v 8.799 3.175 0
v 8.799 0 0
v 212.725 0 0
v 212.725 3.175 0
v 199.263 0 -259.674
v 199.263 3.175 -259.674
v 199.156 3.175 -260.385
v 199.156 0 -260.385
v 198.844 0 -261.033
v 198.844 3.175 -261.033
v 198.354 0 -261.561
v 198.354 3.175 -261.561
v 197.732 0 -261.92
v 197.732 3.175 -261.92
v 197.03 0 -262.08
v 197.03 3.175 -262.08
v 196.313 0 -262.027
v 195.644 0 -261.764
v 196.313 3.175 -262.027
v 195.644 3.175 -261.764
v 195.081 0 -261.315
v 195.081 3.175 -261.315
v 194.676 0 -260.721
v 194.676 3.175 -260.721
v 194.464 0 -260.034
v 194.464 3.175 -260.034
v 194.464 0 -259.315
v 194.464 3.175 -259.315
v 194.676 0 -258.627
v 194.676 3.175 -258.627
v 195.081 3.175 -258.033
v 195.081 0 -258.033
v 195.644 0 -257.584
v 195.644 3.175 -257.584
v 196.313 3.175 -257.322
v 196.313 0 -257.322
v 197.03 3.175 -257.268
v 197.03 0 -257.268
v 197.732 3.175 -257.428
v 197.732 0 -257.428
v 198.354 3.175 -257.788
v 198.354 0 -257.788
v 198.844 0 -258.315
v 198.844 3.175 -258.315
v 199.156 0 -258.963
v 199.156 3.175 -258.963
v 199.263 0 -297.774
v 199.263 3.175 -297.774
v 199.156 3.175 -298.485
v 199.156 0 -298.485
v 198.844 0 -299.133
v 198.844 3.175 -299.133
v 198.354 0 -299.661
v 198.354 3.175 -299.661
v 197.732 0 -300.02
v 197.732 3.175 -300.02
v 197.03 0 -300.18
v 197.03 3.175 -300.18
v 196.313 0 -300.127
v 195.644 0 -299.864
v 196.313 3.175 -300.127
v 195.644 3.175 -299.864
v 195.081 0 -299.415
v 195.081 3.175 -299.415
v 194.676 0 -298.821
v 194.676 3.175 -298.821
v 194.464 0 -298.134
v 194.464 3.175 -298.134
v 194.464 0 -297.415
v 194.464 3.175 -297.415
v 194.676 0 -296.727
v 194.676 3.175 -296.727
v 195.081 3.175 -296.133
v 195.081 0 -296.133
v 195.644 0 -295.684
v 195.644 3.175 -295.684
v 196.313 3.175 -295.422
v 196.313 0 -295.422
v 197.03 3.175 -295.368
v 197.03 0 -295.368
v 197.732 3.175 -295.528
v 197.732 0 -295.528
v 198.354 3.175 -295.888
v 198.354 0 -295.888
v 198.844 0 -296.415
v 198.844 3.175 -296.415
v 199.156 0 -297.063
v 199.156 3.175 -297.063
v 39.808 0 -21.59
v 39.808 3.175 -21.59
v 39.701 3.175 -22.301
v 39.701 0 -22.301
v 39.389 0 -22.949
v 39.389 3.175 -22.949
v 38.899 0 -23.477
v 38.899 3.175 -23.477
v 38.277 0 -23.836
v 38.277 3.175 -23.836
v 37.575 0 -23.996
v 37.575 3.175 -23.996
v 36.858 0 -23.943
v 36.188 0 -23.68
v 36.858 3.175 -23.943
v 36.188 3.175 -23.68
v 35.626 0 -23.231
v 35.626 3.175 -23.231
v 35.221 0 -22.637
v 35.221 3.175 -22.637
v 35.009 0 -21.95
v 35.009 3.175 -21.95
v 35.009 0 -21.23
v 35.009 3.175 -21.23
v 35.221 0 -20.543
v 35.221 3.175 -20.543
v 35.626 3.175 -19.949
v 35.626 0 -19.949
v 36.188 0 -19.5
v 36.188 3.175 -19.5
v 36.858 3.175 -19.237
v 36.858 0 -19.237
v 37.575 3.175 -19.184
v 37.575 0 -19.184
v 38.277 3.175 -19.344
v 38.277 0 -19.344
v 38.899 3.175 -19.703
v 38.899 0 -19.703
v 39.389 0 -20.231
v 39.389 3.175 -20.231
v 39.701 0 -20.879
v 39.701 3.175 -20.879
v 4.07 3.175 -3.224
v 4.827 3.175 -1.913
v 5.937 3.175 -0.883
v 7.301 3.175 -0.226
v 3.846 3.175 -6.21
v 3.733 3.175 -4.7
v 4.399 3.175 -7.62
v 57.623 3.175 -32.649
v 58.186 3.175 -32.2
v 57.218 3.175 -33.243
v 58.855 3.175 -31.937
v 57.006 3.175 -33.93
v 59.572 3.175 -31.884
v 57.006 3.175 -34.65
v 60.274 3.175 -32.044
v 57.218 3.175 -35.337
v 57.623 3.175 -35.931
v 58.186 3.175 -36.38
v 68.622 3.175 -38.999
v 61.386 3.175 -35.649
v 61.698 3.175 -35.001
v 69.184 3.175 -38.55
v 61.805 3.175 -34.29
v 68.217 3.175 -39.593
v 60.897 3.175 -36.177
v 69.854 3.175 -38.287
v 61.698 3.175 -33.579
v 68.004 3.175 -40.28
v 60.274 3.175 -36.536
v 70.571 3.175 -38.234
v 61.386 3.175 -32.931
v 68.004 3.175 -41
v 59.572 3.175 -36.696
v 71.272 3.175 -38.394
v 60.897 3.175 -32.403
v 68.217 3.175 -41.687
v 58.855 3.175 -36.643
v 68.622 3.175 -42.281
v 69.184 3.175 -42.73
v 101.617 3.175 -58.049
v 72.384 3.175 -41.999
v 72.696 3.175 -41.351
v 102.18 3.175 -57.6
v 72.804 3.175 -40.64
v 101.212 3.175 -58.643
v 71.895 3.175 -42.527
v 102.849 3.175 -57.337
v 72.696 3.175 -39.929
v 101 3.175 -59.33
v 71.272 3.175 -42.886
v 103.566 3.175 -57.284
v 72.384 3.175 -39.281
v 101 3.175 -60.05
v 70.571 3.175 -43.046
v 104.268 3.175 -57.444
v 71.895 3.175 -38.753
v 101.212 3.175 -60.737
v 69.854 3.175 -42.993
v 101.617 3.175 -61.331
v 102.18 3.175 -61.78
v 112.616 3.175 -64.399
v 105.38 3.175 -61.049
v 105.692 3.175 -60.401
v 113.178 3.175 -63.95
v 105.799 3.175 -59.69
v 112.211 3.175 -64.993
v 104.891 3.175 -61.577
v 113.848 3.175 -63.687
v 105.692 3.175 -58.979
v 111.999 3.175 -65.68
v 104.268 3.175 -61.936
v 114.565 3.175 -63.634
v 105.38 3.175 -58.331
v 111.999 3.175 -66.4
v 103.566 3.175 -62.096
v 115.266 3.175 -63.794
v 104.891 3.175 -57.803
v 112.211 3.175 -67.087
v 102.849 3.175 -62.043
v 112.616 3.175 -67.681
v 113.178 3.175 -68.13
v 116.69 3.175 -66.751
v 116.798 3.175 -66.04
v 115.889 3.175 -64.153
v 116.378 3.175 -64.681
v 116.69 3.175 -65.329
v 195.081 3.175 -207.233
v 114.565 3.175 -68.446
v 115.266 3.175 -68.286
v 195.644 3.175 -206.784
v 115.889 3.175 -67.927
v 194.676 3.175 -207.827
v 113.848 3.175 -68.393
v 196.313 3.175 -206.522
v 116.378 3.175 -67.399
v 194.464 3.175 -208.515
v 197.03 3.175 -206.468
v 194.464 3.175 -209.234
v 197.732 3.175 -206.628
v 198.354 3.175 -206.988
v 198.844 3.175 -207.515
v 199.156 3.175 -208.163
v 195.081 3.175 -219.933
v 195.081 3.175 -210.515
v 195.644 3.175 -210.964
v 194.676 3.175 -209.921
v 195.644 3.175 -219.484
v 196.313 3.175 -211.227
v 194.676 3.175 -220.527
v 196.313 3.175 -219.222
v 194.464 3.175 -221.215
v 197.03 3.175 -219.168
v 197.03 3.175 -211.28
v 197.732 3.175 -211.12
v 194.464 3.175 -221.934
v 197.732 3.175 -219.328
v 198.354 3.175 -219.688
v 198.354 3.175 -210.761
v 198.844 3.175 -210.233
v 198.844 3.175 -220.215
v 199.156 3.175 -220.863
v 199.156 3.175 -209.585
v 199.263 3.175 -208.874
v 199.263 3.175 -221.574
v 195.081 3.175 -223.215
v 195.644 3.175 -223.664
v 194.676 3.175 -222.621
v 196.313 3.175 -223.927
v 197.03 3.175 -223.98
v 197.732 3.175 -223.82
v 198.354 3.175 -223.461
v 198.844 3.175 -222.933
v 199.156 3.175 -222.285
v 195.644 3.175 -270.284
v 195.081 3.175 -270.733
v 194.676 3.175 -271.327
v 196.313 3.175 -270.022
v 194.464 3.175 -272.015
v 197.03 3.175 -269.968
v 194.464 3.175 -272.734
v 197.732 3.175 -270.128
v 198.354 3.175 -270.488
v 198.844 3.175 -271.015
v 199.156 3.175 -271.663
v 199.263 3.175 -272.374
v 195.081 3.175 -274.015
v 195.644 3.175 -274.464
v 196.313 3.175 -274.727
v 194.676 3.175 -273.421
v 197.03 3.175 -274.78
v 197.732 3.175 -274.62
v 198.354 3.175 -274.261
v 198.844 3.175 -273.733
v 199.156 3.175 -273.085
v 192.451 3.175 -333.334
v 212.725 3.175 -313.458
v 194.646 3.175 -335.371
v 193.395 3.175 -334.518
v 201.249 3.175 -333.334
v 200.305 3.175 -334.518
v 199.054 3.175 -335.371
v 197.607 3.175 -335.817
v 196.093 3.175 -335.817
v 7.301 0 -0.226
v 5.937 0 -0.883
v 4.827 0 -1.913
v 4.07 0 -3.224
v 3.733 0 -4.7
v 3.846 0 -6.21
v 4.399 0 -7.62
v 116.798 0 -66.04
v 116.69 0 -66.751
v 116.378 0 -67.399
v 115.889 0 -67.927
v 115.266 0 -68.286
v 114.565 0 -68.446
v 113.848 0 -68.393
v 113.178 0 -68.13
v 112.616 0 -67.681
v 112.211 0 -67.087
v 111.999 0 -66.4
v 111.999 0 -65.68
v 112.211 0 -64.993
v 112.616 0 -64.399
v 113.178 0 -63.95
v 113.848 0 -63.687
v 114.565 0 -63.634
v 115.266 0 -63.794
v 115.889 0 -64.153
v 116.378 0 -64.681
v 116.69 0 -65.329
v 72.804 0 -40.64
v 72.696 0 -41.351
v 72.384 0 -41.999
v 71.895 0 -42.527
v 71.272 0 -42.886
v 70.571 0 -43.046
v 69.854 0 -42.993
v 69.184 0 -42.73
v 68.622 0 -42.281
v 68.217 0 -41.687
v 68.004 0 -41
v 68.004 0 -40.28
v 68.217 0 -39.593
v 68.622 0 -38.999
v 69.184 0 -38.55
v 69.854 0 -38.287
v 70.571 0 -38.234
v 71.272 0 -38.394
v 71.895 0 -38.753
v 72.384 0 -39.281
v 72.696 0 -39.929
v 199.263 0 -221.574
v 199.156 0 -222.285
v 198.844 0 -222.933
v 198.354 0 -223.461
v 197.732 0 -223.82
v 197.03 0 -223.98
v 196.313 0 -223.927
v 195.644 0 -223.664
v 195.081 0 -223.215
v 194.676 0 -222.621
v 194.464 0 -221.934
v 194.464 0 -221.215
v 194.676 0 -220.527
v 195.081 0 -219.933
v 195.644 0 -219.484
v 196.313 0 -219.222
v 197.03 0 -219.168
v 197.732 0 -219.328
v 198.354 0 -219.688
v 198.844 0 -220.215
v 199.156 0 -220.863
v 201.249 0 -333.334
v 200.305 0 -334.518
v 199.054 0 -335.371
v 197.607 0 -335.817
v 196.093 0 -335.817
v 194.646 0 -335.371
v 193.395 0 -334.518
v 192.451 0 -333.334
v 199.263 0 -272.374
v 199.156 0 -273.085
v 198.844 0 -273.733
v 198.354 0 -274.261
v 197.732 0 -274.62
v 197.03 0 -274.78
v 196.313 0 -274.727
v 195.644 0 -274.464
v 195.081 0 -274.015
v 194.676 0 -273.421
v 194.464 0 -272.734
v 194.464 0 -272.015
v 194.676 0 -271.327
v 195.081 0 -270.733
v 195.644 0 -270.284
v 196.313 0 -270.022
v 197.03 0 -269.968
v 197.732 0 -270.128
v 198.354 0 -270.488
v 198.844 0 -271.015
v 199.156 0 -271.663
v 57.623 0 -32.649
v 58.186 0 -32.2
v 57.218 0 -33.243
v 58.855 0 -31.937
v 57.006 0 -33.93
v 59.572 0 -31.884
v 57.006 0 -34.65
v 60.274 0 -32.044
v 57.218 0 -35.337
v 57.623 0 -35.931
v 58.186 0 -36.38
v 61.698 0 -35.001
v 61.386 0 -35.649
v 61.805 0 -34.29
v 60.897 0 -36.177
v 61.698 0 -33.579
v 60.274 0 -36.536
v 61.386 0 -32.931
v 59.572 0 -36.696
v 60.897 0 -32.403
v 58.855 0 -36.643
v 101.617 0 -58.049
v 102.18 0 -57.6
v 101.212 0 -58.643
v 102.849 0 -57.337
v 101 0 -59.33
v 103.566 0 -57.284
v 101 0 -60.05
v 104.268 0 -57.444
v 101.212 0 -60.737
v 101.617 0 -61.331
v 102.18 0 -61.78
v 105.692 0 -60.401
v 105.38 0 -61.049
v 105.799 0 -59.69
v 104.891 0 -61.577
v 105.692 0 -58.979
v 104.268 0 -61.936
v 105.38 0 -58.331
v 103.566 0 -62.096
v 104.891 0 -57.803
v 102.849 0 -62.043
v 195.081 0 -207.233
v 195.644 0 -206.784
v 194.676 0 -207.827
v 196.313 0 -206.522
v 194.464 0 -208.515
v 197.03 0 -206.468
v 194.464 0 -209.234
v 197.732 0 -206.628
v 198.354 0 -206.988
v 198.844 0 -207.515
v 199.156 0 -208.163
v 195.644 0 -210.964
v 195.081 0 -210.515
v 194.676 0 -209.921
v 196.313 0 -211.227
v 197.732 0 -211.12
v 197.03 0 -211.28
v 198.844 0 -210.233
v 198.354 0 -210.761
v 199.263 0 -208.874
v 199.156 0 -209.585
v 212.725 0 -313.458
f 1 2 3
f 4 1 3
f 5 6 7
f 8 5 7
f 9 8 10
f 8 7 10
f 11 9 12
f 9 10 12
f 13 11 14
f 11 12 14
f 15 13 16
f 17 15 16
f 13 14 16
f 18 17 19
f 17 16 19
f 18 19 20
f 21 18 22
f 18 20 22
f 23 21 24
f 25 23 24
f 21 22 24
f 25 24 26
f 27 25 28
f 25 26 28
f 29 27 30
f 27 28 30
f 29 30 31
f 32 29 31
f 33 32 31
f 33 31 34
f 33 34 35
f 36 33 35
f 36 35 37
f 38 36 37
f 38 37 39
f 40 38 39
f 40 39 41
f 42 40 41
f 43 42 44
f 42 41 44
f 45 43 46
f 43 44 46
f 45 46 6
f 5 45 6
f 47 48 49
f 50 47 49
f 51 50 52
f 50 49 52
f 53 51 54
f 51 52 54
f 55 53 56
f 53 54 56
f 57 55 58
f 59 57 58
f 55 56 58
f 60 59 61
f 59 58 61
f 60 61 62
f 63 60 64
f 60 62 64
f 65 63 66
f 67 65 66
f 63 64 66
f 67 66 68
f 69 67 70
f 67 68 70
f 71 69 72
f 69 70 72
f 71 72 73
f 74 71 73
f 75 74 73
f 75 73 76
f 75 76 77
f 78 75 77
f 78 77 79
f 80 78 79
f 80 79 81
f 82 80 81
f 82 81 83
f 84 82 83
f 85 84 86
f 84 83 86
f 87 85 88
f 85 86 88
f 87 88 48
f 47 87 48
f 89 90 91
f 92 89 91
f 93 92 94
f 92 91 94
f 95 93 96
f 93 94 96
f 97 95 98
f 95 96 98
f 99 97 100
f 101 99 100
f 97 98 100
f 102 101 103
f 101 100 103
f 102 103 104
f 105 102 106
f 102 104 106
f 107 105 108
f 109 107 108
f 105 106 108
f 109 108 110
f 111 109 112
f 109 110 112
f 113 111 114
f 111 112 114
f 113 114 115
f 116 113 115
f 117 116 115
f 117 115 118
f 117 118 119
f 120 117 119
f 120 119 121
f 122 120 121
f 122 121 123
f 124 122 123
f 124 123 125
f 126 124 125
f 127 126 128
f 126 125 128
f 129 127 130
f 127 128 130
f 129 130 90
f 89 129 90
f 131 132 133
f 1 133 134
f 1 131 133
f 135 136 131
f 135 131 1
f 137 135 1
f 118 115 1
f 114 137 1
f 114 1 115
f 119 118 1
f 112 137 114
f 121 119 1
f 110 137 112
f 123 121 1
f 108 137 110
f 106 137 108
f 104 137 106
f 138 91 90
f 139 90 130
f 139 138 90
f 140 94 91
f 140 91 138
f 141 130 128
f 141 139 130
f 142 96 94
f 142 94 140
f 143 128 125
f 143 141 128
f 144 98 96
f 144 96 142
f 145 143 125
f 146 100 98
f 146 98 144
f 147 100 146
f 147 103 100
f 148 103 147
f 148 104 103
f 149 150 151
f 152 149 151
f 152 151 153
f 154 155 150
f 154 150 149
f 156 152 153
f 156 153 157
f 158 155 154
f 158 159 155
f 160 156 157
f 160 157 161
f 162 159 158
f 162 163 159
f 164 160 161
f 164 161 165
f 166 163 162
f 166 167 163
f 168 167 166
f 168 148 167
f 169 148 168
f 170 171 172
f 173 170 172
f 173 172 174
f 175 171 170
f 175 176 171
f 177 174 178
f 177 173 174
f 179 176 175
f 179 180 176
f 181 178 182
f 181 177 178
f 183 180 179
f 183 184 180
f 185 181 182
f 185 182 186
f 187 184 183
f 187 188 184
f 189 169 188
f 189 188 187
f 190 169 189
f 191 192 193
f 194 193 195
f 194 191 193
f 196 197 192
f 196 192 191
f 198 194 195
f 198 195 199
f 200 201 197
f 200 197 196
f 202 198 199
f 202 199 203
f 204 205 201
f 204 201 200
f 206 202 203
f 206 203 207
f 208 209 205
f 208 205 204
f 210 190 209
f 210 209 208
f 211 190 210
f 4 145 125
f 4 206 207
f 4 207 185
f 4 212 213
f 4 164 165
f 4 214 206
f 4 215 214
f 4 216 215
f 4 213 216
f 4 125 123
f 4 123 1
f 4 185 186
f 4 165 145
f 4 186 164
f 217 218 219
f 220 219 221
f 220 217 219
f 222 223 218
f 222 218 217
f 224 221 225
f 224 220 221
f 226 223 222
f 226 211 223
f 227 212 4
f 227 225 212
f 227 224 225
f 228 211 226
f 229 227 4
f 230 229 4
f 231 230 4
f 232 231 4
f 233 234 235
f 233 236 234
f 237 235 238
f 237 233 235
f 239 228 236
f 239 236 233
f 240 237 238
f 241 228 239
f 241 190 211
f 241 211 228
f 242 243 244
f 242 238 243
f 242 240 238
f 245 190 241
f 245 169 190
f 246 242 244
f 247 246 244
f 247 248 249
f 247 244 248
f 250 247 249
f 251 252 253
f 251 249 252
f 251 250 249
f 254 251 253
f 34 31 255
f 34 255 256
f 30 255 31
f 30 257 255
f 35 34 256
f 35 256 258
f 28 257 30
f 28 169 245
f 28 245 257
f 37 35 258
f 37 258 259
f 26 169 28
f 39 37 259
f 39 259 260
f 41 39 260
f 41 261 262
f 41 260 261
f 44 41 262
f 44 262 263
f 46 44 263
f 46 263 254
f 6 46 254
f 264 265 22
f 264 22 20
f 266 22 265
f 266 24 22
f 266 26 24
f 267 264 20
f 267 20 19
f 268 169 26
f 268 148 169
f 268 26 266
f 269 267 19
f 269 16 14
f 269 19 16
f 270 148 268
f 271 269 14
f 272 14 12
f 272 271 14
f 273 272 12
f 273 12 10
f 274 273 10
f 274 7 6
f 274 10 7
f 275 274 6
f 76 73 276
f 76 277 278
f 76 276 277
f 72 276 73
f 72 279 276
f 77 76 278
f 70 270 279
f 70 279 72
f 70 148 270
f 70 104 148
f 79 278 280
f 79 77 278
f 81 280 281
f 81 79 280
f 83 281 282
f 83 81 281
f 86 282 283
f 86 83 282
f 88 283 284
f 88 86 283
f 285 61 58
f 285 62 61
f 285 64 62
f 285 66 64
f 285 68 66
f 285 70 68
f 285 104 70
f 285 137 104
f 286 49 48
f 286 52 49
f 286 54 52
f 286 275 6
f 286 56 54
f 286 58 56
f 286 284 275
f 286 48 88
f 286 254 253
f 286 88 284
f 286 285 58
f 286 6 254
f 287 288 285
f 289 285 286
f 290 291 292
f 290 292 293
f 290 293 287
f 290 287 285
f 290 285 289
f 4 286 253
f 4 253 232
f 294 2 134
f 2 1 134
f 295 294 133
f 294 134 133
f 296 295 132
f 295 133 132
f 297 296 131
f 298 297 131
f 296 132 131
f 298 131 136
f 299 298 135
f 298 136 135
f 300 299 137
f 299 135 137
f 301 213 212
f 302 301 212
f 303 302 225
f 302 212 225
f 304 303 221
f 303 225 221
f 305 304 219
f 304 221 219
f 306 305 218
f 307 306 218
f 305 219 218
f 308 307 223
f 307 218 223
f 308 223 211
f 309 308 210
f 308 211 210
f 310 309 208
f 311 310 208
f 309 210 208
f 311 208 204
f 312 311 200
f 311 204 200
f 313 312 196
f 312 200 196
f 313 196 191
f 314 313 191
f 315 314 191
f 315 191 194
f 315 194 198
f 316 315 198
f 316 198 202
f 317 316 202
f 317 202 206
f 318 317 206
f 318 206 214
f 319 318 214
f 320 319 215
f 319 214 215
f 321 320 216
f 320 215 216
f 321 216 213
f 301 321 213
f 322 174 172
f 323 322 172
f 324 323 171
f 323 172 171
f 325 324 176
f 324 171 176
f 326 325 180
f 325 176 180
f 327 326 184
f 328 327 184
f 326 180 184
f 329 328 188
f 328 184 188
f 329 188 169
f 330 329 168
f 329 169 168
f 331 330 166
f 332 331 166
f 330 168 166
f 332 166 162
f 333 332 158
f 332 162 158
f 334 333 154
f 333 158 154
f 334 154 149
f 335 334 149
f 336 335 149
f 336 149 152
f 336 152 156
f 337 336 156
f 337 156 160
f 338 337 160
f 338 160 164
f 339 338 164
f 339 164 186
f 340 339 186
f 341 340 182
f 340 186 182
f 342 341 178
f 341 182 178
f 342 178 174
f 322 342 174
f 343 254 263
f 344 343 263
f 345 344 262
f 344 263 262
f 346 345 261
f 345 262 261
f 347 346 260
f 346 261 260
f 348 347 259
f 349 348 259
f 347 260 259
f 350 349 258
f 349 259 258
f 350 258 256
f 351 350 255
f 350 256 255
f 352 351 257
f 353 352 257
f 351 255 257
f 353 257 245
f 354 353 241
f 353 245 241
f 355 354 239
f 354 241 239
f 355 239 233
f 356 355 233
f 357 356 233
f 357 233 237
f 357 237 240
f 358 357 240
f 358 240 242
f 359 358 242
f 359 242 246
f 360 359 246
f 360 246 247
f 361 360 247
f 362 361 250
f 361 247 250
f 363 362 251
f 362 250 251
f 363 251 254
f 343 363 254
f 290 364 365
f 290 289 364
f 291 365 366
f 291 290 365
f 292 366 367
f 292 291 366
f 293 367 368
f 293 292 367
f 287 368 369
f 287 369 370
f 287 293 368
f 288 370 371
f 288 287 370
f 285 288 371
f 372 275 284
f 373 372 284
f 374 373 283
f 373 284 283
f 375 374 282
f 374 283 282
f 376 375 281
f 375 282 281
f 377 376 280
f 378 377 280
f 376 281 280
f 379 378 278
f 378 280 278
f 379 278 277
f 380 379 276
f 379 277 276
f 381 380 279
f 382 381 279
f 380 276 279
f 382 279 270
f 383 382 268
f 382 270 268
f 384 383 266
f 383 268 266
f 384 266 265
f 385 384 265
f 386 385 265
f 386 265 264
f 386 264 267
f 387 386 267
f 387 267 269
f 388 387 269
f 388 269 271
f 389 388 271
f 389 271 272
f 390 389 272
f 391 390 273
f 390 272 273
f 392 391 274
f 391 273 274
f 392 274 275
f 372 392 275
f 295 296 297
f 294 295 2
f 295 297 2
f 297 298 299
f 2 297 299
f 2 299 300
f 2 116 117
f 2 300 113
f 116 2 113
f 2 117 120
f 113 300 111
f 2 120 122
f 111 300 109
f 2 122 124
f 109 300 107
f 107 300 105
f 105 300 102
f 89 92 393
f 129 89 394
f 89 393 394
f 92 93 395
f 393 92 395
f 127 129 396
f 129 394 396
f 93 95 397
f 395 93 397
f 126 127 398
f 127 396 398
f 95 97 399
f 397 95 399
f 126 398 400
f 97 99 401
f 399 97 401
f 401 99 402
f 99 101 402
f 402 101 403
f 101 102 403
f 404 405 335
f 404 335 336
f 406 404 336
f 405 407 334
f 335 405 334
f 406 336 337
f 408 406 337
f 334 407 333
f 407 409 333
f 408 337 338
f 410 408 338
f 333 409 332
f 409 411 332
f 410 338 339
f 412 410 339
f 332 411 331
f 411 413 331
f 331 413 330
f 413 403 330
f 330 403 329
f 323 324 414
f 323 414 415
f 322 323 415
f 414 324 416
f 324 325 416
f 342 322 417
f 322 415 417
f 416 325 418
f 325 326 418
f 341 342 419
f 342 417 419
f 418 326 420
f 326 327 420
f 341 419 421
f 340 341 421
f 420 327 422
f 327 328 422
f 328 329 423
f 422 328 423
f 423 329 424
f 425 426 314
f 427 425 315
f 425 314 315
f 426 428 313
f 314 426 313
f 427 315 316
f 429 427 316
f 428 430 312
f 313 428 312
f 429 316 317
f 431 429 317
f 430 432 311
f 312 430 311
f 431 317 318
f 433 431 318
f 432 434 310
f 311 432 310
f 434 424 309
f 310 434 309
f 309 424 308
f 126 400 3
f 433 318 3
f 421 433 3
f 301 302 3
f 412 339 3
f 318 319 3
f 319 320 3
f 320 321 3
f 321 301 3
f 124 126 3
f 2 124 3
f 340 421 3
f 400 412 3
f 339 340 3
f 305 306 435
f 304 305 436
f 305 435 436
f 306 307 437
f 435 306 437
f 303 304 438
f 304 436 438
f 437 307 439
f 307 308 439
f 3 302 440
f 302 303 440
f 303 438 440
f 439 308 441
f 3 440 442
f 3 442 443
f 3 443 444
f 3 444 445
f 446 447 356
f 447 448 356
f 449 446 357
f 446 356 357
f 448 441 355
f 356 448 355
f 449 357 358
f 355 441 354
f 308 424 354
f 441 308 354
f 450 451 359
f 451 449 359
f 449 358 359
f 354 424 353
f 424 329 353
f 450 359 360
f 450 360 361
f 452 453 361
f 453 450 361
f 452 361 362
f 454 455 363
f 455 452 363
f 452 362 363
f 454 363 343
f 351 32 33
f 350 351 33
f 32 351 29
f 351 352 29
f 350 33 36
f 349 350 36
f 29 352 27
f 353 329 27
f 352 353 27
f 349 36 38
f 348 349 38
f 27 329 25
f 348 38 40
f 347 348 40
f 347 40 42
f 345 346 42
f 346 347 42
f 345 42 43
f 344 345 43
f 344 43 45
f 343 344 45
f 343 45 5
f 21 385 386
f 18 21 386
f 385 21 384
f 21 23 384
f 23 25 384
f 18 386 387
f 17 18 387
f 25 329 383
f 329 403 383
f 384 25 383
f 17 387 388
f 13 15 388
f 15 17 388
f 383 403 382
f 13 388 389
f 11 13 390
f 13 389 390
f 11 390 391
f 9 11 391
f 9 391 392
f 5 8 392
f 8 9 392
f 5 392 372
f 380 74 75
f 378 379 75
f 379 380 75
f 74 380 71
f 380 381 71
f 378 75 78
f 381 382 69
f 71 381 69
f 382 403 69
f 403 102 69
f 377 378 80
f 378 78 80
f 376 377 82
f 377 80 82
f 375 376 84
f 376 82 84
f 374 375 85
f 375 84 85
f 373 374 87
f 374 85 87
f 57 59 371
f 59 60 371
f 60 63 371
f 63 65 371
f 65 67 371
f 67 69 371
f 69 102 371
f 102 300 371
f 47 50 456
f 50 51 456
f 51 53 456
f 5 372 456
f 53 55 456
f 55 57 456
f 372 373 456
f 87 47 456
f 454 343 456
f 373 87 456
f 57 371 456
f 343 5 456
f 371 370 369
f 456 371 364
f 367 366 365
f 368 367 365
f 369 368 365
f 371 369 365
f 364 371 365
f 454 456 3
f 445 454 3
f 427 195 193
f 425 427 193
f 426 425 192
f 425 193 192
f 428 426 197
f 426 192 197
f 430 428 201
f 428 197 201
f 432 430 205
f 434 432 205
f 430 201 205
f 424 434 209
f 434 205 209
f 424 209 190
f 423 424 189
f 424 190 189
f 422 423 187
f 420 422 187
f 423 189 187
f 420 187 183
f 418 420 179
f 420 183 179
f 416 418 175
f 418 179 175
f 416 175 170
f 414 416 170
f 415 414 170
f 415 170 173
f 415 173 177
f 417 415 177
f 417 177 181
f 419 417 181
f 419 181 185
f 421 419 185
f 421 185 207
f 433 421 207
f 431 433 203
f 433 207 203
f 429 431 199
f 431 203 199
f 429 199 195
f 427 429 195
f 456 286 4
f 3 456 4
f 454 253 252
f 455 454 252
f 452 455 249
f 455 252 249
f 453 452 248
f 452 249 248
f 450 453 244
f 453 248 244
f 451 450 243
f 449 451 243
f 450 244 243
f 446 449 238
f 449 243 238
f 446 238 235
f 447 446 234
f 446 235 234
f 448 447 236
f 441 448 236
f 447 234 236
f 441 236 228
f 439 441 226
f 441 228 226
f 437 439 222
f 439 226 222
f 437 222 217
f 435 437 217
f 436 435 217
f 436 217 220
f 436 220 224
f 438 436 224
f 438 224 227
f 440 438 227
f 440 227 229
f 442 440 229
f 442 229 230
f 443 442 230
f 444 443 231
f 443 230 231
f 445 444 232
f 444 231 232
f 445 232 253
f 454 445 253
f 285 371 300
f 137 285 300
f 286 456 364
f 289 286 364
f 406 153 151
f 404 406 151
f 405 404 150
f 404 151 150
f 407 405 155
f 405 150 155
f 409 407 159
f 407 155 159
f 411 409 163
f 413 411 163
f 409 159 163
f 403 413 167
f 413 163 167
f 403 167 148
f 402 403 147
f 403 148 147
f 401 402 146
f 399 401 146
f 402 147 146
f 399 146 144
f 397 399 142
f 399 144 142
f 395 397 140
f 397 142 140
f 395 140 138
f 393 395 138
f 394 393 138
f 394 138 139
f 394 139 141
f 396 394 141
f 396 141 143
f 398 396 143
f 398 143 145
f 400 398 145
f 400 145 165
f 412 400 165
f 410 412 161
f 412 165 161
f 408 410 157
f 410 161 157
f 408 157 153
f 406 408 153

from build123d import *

# Parameters (mm, degrees)
BOSS_EXTRUDE1_DEPTH = 3.175
FILLET1_R           = 5.08
SKETCH2_R           = 2.413
CUT_EXTRUDE1_DEPTH  = 3.175
SKETCH3_R           = 2.413
CUT_EXTRUDE2_DEPTH  = 3.175


with BuildPart() as part:
    # Sketch1 → Boss-Extrude1 (new body)
    with BuildSketch(Plane(origin=(0, 0, 0), x_dir=(1, 0, 0), z_dir=(0, 1, 0))):
        Polygon((0, 0), (393.7, 0), (196.85, 340.95420147), align=None)
    extrude(amount=BOSS_EXTRUDE1_DEPTH)

    # Fillet1
    fillet1_edges = [part.edges().sort_by_distance(p)[0] for p in [
        (196.85, 1.5875, -340.95420147),
        (393.7, 1.5875, 0),
        (0, 1.5875, 0),
    ]]
    fillet(fillet1_edges, radius=FILLET1_R)

    # Sketch2 → Cut-Extrude1 (cut)
    with BuildSketch(Plane(origin=(0, 3.175, 0), x_dir=(1, 0, 0), z_dir=(0, 1, 0))):
        with Locations((37.394976935, 21.59)):
            Circle(SKETCH2_R)
        with Locations((59.392022192, 34.29)):
            Circle(SKETCH2_R)
        with Locations((70.39054482, 40.64)):
            Circle(SKETCH2_R)
        with Locations((114.384635332, 66.04)):
            Circle(SKETCH2_R)
        with Locations((103.386112704, 59.69)):
            Circle(SKETCH2_R)
        with Locations((196.85, 297.77420147)):
            Circle(SKETCH2_R)
        with Locations((196.85, 272.37420147)):
            Circle(SKETCH2_R)
        with Locations((196.85, 259.67420147)):
            Circle(SKETCH2_R)
        with Locations((196.85, 221.57420147)):
            Circle(SKETCH2_R)
        with Locations((196.85, 208.87420147)):
            Circle(SKETCH2_R)
        with Locations((279.315364668, 66.04)):
            Circle(SKETCH2_R)
        with Locations((290.313887296, 59.69)):
            Circle(SKETCH2_R)
        with Locations((323.30945518, 40.64)):
            Circle(SKETCH2_R)
        with Locations((334.307977808, 34.29)):
            Circle(SKETCH2_R)
        with Locations((356.305023065, 21.59)):
            Circle(SKETCH2_R)
    extrude(amount=-CUT_EXTRUDE1_DEPTH, mode=Mode.SUBTRACT)

    # Sketch3 → Cut-Extrude2 (cut)
    with BuildSketch(Plane(origin=(0, 3.175, 0), x_dir=(1, 0, 0), z_dir=(0, 1, 0))):
        with BuildLine():
            Line((389.300590949, 7.62), (212.725, 313.4578949))
            Line((212.725, 313.4578949), (212.725, 0))
            Line((212.725, 0), (384.901181898, 0))
            ThreePointArc((384.901181898, 0), (389.300590949, 2.54), (389.300590949, 7.62))
        make_face()
        with Locations((290.313887296, 59.69)):
            Circle(SKETCH3_R, mode=Mode.SUBTRACT)
        with Locations((279.315364668, 66.04)):
            Circle(SKETCH3_R, mode=Mode.SUBTRACT)
        with Locations((323.30945518, 40.64)):
            Circle(SKETCH3_R, mode=Mode.SUBTRACT)
        with Locations((334.307977808, 34.29)):
            Circle(SKETCH3_R, mode=Mode.SUBTRACT)
        with Locations((356.305023065, 21.59)):
            Circle(SKETCH3_R, mode=Mode.SUBTRACT)
    extrude(amount=-CUT_EXTRUDE2_DEPTH, mode=Mode.SUBTRACT)


solid = part.part
